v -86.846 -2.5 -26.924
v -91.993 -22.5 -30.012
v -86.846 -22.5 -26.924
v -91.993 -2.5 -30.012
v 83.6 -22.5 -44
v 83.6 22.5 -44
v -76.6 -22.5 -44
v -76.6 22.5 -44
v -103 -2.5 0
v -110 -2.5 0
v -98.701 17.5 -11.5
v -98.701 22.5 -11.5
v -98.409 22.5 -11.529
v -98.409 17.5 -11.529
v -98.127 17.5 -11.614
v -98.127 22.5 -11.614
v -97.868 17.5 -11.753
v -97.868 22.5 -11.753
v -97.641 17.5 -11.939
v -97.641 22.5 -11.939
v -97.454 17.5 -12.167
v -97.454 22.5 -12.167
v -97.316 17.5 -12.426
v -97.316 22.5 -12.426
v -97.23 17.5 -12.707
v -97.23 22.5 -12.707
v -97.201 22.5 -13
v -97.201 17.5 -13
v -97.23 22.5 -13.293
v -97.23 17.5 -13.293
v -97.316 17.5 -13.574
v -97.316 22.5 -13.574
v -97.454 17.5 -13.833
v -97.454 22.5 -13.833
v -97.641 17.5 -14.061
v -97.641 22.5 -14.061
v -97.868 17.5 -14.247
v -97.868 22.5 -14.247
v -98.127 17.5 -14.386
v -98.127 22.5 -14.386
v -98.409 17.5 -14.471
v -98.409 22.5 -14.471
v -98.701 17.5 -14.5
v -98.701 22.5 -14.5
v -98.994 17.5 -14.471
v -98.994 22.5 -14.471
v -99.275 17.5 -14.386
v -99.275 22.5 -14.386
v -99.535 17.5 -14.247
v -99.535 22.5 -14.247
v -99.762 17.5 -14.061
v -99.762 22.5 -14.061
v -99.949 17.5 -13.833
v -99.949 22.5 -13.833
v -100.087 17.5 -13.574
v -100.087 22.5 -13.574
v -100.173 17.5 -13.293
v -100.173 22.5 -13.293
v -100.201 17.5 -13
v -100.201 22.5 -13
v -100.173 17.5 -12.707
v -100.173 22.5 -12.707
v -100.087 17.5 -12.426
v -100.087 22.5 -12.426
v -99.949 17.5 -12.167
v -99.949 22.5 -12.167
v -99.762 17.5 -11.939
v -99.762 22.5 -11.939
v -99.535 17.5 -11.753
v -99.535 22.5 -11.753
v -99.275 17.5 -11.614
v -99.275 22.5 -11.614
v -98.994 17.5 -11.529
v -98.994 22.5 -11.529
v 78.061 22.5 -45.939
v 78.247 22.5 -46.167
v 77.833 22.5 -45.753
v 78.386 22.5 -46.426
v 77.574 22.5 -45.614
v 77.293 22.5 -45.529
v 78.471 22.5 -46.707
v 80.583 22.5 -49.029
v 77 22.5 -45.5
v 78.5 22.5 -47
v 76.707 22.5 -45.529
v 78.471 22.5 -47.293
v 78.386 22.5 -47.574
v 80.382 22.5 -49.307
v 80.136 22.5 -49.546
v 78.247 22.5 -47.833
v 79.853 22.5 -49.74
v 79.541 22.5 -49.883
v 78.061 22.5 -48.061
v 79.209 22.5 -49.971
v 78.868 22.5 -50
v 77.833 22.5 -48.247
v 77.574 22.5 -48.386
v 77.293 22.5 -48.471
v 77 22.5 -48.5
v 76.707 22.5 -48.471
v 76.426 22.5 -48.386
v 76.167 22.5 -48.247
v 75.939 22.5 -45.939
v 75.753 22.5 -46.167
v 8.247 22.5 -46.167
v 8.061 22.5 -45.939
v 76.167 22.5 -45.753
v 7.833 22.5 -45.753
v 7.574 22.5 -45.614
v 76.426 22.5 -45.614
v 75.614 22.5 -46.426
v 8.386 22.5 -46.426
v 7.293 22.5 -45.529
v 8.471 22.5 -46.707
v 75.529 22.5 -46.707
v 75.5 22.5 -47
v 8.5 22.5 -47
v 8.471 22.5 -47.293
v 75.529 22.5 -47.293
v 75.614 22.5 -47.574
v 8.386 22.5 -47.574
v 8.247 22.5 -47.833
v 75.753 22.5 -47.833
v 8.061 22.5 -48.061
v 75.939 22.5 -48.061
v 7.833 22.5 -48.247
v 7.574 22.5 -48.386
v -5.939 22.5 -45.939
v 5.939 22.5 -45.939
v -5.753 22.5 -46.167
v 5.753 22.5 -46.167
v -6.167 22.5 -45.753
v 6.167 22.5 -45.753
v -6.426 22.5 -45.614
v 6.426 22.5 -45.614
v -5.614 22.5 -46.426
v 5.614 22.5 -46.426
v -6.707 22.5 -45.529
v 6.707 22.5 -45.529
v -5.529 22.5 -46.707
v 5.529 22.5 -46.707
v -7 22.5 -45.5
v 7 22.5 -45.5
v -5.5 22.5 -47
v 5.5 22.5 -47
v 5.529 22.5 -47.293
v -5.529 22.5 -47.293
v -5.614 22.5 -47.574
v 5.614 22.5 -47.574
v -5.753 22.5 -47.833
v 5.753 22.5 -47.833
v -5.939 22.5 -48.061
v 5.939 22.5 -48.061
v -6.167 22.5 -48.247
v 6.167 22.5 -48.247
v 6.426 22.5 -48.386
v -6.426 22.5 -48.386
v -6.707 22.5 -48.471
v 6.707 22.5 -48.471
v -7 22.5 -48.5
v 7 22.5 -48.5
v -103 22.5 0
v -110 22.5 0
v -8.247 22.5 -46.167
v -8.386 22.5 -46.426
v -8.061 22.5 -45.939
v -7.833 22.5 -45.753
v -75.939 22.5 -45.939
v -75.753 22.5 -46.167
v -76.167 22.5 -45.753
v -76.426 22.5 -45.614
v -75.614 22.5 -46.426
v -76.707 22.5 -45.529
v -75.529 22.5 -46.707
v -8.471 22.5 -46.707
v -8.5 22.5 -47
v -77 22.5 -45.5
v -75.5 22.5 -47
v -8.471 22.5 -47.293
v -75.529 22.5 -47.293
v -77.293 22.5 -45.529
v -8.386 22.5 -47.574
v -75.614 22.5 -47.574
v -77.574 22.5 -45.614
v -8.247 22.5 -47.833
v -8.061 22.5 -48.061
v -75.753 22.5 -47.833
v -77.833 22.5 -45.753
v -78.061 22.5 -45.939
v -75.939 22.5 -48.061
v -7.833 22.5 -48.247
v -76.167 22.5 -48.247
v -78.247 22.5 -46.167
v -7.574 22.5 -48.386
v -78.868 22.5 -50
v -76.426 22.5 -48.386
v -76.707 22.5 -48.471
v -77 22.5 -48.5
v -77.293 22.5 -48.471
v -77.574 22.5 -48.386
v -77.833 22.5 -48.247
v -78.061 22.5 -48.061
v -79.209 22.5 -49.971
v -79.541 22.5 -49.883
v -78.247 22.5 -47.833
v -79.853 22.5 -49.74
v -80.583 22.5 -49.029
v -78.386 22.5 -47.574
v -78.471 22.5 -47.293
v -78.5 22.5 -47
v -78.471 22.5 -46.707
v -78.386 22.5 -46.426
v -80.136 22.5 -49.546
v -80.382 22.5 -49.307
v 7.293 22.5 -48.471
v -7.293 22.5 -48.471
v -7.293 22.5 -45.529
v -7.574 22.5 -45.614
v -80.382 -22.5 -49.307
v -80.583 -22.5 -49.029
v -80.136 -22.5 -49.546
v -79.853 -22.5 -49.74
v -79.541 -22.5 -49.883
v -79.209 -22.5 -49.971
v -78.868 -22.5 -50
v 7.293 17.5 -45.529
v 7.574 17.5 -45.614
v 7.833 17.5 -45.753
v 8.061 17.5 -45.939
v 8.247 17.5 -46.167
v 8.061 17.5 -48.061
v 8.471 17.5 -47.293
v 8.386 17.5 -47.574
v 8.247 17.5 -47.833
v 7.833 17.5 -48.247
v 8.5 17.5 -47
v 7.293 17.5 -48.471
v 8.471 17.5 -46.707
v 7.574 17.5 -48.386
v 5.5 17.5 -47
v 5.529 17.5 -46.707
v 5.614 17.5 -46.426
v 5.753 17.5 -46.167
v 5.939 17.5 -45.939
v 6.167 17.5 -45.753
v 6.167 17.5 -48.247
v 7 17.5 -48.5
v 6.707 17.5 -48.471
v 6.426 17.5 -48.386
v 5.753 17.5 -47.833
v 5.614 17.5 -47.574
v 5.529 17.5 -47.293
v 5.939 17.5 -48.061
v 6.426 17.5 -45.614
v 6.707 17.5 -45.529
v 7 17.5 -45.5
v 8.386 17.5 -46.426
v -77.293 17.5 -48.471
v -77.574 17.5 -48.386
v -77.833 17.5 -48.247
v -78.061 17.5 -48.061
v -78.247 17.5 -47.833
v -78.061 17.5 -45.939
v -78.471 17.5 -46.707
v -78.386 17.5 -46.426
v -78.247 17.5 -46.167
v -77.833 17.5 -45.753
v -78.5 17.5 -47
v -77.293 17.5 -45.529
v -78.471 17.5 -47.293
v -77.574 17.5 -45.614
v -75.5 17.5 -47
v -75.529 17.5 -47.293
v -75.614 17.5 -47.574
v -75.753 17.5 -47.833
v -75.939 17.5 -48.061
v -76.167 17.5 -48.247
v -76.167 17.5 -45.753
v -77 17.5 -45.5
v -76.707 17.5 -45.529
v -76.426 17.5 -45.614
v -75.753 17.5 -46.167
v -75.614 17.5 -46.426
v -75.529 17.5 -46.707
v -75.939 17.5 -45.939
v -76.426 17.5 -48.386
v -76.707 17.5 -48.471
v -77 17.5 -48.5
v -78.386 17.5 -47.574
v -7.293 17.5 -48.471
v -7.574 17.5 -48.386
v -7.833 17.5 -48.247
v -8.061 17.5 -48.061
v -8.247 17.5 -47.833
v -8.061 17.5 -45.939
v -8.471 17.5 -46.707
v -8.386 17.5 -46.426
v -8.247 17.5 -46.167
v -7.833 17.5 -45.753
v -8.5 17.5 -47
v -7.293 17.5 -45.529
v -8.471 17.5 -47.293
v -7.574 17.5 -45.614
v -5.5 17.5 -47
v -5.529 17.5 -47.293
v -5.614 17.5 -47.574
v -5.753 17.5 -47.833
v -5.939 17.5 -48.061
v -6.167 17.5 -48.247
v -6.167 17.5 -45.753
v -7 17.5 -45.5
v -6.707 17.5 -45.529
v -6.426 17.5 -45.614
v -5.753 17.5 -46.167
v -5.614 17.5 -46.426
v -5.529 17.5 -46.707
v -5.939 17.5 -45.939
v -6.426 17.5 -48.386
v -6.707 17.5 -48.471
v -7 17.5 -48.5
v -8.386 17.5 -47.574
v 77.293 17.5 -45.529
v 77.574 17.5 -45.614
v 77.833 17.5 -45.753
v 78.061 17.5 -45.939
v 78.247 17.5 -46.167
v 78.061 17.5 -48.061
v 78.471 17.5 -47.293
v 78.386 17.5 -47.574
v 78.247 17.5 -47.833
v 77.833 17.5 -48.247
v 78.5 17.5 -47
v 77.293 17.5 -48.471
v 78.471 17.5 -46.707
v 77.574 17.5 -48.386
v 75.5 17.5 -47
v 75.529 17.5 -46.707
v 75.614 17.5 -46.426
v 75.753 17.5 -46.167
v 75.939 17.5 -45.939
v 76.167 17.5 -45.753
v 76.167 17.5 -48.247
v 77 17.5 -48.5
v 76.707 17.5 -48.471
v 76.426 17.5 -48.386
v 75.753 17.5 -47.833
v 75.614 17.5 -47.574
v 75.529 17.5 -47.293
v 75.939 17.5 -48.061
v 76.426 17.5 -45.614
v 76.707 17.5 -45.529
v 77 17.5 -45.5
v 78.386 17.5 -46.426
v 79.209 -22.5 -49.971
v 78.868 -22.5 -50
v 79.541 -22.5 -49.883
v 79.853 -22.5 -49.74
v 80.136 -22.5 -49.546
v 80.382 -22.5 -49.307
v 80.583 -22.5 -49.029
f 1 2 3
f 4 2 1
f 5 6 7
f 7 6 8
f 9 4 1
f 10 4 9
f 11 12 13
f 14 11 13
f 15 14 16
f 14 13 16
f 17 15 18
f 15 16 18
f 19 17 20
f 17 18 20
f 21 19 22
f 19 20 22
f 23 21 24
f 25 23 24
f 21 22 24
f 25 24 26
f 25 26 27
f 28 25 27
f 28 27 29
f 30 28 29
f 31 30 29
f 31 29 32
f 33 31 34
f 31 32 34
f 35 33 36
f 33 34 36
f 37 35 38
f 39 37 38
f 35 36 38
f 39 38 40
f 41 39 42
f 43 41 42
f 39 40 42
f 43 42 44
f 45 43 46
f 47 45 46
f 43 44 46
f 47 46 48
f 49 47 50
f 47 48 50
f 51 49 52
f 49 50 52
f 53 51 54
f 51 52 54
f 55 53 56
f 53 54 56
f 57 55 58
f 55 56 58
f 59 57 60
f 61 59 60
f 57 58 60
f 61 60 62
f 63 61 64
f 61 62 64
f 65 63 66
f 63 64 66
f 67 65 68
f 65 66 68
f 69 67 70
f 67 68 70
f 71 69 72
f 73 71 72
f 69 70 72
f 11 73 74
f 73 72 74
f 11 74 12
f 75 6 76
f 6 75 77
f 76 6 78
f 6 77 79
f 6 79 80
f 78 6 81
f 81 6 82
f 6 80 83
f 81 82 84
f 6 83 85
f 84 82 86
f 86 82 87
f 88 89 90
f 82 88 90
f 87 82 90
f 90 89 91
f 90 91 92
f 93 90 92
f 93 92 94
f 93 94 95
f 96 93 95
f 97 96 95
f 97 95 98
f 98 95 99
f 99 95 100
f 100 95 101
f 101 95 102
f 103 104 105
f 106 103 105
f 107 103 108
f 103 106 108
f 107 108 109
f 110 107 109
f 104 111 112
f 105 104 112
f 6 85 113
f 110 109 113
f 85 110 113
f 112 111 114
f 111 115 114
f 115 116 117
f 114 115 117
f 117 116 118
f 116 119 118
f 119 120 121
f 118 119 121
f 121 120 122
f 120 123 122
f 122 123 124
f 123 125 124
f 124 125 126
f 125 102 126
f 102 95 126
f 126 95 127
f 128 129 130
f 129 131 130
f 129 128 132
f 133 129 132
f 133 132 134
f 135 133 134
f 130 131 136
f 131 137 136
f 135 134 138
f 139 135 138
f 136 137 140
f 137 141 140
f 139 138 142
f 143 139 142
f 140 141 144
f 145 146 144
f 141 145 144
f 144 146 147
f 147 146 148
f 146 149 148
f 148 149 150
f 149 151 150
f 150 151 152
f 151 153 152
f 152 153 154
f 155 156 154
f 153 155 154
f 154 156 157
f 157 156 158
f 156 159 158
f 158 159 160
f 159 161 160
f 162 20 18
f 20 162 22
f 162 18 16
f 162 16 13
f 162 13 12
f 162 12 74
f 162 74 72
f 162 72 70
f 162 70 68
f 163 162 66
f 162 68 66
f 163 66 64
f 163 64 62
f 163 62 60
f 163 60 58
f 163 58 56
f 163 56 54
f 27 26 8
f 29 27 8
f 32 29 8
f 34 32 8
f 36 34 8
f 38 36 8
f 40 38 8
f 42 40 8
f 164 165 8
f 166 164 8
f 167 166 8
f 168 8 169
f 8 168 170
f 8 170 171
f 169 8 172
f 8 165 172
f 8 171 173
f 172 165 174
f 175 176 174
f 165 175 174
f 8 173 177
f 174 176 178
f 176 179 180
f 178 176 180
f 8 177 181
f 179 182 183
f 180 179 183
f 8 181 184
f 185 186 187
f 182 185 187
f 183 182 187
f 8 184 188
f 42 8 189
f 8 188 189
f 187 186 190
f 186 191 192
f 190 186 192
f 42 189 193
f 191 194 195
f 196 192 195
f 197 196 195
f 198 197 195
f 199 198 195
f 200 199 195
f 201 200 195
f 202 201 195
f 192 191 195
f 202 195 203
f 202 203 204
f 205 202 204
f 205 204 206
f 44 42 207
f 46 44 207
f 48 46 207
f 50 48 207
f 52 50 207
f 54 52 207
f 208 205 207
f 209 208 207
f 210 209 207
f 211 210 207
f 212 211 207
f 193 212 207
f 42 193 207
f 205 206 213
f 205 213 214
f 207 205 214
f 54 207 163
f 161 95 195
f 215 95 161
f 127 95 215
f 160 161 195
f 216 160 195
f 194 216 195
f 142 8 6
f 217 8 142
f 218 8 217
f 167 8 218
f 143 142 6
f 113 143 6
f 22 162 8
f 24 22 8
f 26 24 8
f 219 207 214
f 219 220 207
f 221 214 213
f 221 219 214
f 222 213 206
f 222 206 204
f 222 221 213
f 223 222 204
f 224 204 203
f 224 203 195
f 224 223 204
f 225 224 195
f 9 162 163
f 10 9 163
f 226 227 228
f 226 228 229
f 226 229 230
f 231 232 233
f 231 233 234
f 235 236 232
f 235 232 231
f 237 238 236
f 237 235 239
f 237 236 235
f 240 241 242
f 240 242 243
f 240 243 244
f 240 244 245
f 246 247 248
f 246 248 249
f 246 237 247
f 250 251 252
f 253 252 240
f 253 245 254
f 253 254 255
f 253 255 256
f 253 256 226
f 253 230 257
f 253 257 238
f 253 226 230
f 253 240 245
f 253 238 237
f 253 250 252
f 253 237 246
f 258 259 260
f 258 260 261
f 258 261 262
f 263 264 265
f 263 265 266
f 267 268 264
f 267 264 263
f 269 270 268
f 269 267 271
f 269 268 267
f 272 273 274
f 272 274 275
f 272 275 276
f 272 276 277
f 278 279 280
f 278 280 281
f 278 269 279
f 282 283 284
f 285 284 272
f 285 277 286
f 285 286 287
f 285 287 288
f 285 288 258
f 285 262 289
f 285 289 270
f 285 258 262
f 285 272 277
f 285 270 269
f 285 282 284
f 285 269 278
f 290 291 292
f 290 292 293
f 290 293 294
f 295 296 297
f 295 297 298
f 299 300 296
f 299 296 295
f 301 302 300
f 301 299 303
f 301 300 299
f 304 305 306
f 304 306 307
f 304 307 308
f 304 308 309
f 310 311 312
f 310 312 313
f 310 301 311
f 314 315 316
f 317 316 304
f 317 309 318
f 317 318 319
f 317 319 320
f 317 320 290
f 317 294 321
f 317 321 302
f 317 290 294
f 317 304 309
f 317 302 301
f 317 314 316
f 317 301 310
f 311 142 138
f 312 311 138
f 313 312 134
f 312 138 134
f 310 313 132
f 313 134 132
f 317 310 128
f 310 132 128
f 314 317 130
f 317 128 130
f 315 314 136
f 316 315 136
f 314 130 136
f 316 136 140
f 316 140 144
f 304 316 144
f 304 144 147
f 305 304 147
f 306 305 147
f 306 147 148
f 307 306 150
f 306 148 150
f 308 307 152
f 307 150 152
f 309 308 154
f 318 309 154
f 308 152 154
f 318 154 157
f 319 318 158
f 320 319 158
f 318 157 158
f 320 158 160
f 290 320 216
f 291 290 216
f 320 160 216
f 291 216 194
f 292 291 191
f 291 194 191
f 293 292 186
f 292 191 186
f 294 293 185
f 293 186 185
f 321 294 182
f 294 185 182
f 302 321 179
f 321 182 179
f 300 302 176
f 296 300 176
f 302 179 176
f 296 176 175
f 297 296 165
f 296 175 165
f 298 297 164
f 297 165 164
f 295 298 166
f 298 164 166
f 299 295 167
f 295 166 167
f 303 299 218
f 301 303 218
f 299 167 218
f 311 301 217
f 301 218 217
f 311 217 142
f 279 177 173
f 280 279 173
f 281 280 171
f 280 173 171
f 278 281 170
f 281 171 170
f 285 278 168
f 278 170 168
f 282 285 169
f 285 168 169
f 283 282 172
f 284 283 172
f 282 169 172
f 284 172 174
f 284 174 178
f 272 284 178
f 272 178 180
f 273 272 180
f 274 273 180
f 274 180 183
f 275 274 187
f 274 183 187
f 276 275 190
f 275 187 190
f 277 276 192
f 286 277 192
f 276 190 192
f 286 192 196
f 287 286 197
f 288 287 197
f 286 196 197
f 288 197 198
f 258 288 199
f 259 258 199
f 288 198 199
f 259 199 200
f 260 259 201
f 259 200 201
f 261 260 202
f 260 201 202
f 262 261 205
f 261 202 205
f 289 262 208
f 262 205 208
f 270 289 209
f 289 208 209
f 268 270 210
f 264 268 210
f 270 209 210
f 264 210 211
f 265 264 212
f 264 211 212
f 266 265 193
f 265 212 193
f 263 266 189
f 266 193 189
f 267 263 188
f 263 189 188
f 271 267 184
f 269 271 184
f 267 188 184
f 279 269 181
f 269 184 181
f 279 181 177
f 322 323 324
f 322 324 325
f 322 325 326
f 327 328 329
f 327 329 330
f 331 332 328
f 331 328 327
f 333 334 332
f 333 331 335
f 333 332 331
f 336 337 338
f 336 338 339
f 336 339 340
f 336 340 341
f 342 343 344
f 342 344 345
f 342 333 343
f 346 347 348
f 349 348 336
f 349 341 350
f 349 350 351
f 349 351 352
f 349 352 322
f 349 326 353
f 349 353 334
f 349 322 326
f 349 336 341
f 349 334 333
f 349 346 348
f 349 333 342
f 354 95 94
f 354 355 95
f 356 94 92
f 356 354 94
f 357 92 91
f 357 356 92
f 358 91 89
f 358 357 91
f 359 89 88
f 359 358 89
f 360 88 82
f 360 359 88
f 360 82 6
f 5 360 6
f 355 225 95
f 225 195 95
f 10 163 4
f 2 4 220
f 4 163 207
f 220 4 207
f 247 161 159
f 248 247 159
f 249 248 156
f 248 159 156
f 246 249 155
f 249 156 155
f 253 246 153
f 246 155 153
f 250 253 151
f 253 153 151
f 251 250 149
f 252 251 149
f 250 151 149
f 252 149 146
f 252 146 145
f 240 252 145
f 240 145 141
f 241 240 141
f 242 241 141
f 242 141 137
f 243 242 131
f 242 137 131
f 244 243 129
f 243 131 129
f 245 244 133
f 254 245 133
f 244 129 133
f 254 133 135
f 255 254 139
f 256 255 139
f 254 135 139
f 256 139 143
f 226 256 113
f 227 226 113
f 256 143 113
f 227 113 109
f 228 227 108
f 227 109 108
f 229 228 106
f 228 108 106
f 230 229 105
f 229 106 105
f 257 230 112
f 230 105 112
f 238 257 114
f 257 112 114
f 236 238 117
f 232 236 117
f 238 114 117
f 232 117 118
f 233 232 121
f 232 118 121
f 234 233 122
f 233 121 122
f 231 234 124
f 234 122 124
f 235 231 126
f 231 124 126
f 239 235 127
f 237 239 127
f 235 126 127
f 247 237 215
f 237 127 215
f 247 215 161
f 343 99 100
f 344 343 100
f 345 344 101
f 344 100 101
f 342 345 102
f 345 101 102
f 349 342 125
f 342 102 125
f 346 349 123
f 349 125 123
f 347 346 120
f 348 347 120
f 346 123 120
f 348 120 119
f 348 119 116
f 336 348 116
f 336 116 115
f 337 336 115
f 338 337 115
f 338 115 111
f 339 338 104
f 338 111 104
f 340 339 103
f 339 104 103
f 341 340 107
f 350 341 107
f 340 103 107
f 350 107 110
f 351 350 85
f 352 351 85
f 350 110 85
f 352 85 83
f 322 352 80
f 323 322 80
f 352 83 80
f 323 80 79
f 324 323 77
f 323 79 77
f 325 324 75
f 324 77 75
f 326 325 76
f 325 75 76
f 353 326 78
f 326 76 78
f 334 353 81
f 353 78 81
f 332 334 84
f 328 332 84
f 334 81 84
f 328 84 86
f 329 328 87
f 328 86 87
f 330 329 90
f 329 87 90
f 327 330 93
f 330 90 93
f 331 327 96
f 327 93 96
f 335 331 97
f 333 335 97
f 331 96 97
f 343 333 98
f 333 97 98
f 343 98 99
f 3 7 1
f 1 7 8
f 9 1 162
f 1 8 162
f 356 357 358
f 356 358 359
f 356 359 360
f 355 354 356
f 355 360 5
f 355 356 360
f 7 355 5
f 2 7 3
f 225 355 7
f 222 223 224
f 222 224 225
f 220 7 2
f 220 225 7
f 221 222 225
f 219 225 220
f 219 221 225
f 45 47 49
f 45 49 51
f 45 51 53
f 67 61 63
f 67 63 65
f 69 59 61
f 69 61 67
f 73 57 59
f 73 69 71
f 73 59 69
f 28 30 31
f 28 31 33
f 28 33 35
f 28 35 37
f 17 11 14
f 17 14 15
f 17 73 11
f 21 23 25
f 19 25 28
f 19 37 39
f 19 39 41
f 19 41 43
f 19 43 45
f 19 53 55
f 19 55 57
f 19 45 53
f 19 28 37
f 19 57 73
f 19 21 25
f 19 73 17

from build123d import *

# Parameters (mm, degrees)
BOSS_EXTRUDE1_DEPTH = 22.5
SKETCH2_R           = 1.5
CUT_EXTRUDE1_DEPTH  = 5
FILLET1_R           = 2
SKETCH3_W           = 35
SKETCH3_H           = 20
CUT_EXTRUDE2_DEPTH  = 10
SKETCH6_W           = 44
SKETCH6_H           = 45
CUT_EXTRUDE3_DEPTH  = 123.907485533


with BuildPart() as part:
    # Sketch1 → Boss-Extrude1 (new, symmetric)
    with BuildSketch(Plane(origin=(0, 0, 0), x_dir=(1, 0, 0), z_dir=(0, 1, 0))):
        Polygon((-110, 0), (-80, 50), (80, 50), (110, 0), (103, 0), (76.6, 44), (-76.6, 44), (-103, 0), align=None)
    extrude(amount=BOSS_EXTRUDE1_DEPTH, both=True)

    # Sketch2 → Cut-Extrude1 (cut)
    with BuildSketch(Plane(origin=(0, 22.5, 0), x_dir=(1, 0, 0), z_dir=(0, 1, 0))):
        with Locations(Location((-98.701428863, 13, 0), (0, 0, 270))):
            Circle(SKETCH2_R)
        with Locations(Location((-77, 47, 0), (0, 0, 270))):
            Circle(SKETCH2_R)
        with Locations(Location((-7, 47, 0), (0, 0, 270))):
            Circle(SKETCH2_R)
        with Locations(Location((7, 47, 0), (0, 0, 90))):
            Circle(SKETCH2_R)
        with Locations(Location((77, 47, 0), (0, 0, 90))):
            Circle(SKETCH2_R)
        with Locations(Location((98.701428863, 13, 0), (0, 0, 90))):
            Circle(SKETCH2_R)
    extrude(amount=-CUT_EXTRUDE1_DEPTH, mode=Mode.SUBTRACT)

    # Fillet1
    fillet1_edges = [part.edges().sort_by_distance(p)[0] for p in [
        (-80, 0, -50),
        (80, 0, -50),
    ]]
    fillet(fillet1_edges, radius=FILLET1_R)

    # Sketch3 → Cut-Extrude2 (cut)
    with BuildSketch(Plane(origin=(-80.882352941, 0, -48.529411765), x_dir=(-0.5144957554275265, 0, 0.8574929257125443), z_dir=(-0.8574929257125443, 0, -0.5144957554275265))):
        with Locations((39.094533097, -12.5)):
            Rectangle(SKETCH3_W, SKETCH3_H)
    extrude(amount=-CUT_EXTRUDE2_DEPTH, mode=Mode.SUBTRACT)

    # Sketch6 → Cut-Extrude3 (cut, through all)
    with BuildSketch(Plane(origin=(0, 0, 0), x_dir=(0, 0, -1), z_dir=(1, 0, 0))):
        with Locations((22, 0)):
            Rectangle(SKETCH6_W, SKETCH6_H)
    extrude(amount=CUT_EXTRUDE3_DEPTH, mode=Mode.SUBTRACT)


solid = part.part
